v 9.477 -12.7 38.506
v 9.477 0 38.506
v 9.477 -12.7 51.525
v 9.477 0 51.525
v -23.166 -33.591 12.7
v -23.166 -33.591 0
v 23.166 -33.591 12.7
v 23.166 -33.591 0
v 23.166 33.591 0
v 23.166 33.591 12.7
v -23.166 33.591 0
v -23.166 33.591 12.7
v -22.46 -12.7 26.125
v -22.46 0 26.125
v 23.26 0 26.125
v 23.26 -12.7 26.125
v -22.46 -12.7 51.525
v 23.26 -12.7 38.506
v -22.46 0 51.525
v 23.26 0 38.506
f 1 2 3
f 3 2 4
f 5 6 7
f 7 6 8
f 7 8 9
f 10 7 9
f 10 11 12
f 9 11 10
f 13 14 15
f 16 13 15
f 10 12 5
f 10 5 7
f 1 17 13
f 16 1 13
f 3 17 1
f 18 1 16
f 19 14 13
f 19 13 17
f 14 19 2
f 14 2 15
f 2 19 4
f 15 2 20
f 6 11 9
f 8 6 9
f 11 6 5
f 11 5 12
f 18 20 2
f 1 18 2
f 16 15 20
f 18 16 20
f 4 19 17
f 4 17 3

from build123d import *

# Parameters (mm, degrees)
F0_W     = 46.332154
F0_H     = 67.181624
F1_DEPTH = 12.7
F2_W     = 45.72
F2_H     = 25.4
F3_DEPTH = 12.7
F4_W     = 13.783416
F4_H     = 13.018981
F5_DEPTH = 25.4


with BuildPart() as f1:
    # F0 (on Top) → F1 (new body)
    with BuildSketch(Plane.XY):
        Rectangle(F0_W, F0_H)
    extrude(amount=F1_DEPTH)


with BuildPart() as f3:
    # F2 (on Front) → F3 (new body)
    with BuildSketch(Plane.XZ):
        with Locations((0.400082, 38.824569)):
            Rectangle(F2_W, F2_H)
    extrude(amount=F3_DEPTH)

    # F4 (on face) → F5 (cut)
    with BuildSketch(Plane(origin=(0, 0, 0), x_dir=(-1, 0, 0), z_dir=(0, 1, 0))):
        with Locations((-16.368374, 45.015079)):
            Rectangle(F4_W, F4_H)
    extrude(amount=-F5_DEPTH, mode=Mode.SUBTRACT)


solid = Compound([f1.part, f3.part])
